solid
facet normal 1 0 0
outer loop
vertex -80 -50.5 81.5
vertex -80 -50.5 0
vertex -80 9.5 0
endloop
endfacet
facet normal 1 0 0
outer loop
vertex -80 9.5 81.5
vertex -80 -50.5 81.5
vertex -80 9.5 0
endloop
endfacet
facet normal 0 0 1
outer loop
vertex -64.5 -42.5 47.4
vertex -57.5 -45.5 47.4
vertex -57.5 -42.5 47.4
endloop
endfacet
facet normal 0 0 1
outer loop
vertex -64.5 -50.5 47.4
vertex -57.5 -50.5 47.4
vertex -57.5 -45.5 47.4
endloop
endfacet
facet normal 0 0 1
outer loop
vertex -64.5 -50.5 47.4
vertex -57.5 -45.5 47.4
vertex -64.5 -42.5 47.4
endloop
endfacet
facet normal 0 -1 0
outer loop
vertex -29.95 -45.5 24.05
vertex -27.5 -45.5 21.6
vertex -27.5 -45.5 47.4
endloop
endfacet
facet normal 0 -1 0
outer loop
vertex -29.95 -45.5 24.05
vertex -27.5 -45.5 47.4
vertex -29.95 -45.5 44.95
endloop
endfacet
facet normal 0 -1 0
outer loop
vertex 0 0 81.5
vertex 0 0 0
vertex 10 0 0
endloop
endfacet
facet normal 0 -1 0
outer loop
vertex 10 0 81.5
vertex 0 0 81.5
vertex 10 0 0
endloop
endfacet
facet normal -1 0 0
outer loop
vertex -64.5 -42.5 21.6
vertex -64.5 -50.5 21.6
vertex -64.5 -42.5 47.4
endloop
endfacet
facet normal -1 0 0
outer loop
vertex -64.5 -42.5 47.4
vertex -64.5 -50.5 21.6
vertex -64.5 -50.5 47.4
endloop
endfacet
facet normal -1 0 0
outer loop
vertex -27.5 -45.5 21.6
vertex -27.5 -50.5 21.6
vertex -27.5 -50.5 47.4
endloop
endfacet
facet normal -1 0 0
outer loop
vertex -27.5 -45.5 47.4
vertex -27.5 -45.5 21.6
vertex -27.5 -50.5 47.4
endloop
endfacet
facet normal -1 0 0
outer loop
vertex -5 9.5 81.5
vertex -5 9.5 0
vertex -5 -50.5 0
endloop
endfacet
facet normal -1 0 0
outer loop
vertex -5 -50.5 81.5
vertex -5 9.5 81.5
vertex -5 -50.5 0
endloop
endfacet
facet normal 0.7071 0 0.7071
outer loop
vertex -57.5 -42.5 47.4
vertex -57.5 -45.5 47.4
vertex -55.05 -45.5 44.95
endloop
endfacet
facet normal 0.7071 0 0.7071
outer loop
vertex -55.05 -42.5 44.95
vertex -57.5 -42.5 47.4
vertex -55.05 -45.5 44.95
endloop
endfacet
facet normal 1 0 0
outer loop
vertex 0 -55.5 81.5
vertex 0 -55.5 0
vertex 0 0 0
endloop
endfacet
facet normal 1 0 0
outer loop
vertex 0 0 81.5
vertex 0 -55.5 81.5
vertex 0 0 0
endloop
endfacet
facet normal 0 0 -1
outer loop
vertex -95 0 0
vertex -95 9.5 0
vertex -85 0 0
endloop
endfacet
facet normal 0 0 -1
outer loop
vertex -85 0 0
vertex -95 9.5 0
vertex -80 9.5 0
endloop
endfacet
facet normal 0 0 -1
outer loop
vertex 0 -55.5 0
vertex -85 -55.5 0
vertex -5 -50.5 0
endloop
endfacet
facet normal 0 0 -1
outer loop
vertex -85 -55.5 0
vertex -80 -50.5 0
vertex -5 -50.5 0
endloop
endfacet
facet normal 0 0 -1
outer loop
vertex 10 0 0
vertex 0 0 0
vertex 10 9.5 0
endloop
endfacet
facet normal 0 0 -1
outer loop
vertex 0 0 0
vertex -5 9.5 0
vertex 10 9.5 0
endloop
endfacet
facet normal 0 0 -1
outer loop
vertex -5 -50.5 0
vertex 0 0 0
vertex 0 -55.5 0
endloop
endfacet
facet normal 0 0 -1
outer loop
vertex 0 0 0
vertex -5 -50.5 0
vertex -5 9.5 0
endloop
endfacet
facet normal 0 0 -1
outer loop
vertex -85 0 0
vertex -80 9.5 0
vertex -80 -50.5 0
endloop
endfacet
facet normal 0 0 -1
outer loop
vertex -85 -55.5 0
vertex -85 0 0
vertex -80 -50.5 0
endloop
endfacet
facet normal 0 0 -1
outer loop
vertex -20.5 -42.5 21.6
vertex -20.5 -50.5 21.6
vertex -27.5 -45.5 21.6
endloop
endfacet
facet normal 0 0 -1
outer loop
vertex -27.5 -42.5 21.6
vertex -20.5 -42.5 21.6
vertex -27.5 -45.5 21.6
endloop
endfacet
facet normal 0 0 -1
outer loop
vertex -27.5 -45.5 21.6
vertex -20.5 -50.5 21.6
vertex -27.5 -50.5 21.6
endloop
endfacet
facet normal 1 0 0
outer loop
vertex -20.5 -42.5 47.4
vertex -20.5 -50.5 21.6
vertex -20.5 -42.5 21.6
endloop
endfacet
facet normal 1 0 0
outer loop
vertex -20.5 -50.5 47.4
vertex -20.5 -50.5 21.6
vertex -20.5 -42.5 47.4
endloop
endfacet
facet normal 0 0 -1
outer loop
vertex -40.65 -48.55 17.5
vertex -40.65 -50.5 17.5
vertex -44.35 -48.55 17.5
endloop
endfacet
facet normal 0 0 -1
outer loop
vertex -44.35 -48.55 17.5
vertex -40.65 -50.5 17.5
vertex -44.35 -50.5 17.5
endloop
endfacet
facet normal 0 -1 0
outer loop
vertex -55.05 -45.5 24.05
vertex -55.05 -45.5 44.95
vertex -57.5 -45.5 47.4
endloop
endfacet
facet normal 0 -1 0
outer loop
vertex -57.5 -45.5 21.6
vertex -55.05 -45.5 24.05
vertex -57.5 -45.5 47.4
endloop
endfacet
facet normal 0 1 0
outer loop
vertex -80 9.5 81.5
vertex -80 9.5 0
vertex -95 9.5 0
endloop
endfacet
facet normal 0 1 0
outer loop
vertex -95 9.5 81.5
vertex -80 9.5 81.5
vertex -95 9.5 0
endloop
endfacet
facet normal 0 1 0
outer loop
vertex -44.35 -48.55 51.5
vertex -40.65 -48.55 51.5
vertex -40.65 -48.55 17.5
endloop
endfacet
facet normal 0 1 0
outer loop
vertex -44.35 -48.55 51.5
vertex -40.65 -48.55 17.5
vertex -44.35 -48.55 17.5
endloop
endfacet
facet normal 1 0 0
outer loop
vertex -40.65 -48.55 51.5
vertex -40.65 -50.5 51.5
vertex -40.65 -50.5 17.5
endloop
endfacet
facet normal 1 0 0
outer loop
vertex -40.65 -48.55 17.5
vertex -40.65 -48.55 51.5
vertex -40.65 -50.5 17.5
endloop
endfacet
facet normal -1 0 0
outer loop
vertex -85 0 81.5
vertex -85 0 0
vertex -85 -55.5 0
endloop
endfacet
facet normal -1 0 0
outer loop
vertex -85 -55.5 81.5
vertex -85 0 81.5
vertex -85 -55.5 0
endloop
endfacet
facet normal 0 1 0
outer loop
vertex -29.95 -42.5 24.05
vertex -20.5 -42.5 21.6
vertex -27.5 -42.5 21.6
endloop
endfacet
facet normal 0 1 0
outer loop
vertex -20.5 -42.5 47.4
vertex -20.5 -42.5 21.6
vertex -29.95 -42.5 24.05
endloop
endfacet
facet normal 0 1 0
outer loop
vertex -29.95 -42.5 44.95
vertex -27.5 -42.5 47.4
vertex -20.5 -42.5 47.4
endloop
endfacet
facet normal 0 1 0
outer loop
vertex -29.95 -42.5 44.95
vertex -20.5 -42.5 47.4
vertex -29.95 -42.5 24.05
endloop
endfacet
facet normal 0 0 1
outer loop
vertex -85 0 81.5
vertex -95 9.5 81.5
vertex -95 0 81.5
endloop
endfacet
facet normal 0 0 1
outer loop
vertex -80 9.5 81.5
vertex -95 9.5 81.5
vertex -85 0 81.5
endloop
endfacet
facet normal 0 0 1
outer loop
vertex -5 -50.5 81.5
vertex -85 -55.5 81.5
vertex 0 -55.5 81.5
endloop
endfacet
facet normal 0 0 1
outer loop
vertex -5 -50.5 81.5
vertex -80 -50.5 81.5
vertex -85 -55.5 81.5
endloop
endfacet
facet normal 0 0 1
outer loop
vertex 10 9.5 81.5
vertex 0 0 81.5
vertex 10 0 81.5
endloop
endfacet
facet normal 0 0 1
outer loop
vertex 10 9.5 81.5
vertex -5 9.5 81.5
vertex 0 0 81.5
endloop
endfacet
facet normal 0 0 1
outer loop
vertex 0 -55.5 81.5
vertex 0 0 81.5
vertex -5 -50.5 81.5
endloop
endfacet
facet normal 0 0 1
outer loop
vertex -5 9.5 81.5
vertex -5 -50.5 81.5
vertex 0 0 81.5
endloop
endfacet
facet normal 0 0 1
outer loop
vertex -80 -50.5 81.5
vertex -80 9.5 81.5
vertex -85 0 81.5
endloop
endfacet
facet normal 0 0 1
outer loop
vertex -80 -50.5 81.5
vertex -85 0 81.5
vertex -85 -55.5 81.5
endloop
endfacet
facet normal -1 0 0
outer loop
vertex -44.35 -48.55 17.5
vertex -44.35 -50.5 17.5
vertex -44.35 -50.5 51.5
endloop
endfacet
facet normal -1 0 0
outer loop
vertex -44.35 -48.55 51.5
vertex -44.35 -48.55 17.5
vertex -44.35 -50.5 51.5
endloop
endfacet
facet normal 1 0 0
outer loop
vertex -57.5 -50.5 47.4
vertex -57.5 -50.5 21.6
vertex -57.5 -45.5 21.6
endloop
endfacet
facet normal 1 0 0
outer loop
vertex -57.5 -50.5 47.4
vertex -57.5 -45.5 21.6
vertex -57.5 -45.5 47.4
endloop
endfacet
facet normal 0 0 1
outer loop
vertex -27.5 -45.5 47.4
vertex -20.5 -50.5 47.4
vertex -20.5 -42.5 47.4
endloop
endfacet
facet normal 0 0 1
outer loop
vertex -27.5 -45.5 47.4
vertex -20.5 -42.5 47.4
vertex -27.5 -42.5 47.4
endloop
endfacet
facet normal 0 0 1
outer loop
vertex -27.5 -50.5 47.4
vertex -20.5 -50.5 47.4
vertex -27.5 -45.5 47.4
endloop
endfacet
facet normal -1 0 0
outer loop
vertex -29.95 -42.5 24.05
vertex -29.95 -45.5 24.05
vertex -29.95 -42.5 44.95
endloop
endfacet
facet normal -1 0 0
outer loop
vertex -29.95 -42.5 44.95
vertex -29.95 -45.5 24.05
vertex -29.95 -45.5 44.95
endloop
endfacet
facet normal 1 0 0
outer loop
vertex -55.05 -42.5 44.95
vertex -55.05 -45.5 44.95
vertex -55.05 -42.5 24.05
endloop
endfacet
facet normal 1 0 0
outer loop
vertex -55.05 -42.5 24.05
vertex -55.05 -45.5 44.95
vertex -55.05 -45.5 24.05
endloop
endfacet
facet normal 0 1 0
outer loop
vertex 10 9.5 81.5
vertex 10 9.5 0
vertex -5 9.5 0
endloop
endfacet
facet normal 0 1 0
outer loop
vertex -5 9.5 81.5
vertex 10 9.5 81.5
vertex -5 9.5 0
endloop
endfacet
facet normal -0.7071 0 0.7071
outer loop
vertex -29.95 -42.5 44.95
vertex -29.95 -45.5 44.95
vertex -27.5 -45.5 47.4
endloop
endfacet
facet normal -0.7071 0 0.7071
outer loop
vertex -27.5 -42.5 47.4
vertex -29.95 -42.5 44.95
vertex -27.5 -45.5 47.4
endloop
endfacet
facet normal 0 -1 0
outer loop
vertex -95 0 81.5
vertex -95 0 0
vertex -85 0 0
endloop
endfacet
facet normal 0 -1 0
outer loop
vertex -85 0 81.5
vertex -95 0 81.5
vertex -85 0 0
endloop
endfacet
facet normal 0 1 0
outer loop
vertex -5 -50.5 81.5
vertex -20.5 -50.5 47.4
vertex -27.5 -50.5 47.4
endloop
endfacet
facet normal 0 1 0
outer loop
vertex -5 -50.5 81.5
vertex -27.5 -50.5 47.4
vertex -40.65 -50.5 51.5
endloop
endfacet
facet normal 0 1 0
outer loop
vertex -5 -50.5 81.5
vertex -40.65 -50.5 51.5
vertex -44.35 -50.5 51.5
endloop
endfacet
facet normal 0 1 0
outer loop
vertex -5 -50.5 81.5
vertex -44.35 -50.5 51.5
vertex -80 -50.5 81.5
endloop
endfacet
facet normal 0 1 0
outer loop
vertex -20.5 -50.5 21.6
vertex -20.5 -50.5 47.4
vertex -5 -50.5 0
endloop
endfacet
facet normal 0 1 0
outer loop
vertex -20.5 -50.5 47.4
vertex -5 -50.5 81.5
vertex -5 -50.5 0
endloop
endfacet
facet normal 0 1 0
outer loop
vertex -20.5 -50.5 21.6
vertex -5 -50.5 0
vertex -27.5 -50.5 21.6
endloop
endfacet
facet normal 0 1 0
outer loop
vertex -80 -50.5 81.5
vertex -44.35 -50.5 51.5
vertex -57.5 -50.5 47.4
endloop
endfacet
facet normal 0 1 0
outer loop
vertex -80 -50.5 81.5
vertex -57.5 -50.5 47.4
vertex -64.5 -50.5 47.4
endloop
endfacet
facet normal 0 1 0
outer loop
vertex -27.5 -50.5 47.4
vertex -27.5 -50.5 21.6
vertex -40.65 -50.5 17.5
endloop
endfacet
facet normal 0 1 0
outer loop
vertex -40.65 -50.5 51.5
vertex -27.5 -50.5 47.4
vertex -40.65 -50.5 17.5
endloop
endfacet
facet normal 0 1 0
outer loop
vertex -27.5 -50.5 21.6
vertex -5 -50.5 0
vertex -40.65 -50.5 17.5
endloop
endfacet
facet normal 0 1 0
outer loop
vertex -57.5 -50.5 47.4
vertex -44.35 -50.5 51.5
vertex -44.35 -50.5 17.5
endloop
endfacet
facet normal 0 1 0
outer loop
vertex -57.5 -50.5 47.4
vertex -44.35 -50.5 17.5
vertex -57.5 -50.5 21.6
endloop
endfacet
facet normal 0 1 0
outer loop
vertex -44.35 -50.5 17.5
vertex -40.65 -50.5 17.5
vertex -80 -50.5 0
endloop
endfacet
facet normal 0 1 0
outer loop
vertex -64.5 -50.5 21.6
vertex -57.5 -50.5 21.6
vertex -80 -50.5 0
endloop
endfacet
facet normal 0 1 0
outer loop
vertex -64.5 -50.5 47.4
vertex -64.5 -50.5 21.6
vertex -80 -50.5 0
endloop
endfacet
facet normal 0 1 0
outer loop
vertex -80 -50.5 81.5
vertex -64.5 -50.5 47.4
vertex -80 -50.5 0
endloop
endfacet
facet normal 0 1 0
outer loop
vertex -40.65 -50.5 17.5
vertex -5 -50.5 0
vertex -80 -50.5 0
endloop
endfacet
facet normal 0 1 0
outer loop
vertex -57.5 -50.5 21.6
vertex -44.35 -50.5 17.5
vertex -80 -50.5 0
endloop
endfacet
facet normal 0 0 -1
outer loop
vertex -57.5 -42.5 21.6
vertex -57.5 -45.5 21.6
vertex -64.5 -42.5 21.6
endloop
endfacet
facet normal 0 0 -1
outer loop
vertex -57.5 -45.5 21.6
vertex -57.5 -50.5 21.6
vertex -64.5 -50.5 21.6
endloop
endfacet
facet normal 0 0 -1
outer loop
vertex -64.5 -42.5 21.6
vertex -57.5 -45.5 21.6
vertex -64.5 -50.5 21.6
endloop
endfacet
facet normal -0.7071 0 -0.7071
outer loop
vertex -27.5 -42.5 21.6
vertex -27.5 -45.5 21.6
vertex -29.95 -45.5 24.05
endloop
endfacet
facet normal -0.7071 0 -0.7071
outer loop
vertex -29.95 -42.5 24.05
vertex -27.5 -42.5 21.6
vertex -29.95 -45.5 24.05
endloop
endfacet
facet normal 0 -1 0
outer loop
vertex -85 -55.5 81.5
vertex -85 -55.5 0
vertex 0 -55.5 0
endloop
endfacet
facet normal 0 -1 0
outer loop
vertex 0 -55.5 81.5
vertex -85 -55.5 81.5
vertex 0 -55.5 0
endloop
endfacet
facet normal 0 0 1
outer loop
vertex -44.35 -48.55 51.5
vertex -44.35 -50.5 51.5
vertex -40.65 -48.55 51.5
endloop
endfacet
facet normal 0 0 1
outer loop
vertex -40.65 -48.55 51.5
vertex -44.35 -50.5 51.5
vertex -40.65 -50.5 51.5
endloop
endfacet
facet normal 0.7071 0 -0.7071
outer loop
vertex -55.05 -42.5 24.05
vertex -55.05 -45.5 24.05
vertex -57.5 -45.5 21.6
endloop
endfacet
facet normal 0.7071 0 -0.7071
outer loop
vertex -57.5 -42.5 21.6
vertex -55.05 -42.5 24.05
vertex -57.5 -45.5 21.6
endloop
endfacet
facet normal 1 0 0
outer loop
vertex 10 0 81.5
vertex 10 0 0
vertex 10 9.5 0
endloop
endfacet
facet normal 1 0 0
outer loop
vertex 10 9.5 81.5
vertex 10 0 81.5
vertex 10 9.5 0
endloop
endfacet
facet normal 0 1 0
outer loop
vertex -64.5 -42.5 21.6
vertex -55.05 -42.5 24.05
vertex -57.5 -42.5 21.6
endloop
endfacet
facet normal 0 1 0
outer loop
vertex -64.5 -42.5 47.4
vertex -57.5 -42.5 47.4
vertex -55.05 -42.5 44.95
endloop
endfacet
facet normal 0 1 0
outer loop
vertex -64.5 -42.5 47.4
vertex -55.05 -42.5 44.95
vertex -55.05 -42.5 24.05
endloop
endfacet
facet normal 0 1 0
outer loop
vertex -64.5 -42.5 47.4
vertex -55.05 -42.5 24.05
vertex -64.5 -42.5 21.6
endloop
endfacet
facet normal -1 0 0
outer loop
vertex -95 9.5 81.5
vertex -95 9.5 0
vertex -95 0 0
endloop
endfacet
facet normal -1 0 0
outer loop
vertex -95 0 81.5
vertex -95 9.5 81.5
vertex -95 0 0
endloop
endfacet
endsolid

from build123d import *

# Parameters (mm, degrees)
F1_DEPTH = 81.5
F2_W     = 1.85
F2_H     = 25.8
F2_H_2   = 4.1
F3_DEPTH = 1.95
F2_W_2   = 7
F4_DEPTH = 8
F5_START = 5
F5_DEPTH = 3


with BuildPart() as f1:
    # F0 (on Top) → F1 (new body)
    with BuildSketch(Plane.XY):
        Polygon((0, -55.5), (0, 0), (10, 0), (10, 9.5), (-5, 9.5), (-5, -50.5), (-80, -50.5), (-80, 9.5), (-95, 9.5), (-95, 0), (-85, 0), (-85, -55.5), align=None)
    extrude(amount=F1_DEPTH)

    # F2 (on face) → F3 (join)
    with BuildSketch(Plane(origin=(0, -50.5, 0), x_dir=(-1, 0, 0), z_dir=(0, 1, 0))):
        Polygon((42.5, 47.4), (42.5, 51.5), (40.65, 51.5), (40.65, 17.5), (42.5, 17.5), (42.5, 21.6), align=None)
        with Locations((43.425, 34.5)):
            Rectangle(F2_W, F2_H)
        with Locations((43.425, 49.45)):
            Rectangle(F2_W, F2_H_2)
        with Locations((43.425, 19.55)):
            Rectangle(F2_W, F2_H_2)
    extrude(amount=F3_DEPTH)

    # F2 (on face) → F4 (join)
    with BuildSketch(Plane(origin=(0, -50.5, 0), x_dir=(-1, 0, 0), z_dir=(0, 1, 0))):
        with Locations((61, 34.5)):
            Rectangle(F2_W_2, F2_H)
        with Locations((24, 34.5)):
            Rectangle(F2_W_2, F2_H)
    extrude(amount=F4_DEPTH)

    # F2 (on face) → F5 (join)
    with BuildSketch(Plane(origin=(0, -50.5, 0), x_dir=(-1, 0, 0), z_dir=(0, 1, 0)).offset(F5_START)):
        Polygon((29.95, 24.05), (29.95, 44.95), (27.5, 47.4), (27.5, 21.6), align=None)
        Polygon((57.5, 21.6), (57.5, 47.4), (55.05, 44.95), (55.05, 24.05), align=None)
    extrude(amount=F5_DEPTH)


solid = f1.part
